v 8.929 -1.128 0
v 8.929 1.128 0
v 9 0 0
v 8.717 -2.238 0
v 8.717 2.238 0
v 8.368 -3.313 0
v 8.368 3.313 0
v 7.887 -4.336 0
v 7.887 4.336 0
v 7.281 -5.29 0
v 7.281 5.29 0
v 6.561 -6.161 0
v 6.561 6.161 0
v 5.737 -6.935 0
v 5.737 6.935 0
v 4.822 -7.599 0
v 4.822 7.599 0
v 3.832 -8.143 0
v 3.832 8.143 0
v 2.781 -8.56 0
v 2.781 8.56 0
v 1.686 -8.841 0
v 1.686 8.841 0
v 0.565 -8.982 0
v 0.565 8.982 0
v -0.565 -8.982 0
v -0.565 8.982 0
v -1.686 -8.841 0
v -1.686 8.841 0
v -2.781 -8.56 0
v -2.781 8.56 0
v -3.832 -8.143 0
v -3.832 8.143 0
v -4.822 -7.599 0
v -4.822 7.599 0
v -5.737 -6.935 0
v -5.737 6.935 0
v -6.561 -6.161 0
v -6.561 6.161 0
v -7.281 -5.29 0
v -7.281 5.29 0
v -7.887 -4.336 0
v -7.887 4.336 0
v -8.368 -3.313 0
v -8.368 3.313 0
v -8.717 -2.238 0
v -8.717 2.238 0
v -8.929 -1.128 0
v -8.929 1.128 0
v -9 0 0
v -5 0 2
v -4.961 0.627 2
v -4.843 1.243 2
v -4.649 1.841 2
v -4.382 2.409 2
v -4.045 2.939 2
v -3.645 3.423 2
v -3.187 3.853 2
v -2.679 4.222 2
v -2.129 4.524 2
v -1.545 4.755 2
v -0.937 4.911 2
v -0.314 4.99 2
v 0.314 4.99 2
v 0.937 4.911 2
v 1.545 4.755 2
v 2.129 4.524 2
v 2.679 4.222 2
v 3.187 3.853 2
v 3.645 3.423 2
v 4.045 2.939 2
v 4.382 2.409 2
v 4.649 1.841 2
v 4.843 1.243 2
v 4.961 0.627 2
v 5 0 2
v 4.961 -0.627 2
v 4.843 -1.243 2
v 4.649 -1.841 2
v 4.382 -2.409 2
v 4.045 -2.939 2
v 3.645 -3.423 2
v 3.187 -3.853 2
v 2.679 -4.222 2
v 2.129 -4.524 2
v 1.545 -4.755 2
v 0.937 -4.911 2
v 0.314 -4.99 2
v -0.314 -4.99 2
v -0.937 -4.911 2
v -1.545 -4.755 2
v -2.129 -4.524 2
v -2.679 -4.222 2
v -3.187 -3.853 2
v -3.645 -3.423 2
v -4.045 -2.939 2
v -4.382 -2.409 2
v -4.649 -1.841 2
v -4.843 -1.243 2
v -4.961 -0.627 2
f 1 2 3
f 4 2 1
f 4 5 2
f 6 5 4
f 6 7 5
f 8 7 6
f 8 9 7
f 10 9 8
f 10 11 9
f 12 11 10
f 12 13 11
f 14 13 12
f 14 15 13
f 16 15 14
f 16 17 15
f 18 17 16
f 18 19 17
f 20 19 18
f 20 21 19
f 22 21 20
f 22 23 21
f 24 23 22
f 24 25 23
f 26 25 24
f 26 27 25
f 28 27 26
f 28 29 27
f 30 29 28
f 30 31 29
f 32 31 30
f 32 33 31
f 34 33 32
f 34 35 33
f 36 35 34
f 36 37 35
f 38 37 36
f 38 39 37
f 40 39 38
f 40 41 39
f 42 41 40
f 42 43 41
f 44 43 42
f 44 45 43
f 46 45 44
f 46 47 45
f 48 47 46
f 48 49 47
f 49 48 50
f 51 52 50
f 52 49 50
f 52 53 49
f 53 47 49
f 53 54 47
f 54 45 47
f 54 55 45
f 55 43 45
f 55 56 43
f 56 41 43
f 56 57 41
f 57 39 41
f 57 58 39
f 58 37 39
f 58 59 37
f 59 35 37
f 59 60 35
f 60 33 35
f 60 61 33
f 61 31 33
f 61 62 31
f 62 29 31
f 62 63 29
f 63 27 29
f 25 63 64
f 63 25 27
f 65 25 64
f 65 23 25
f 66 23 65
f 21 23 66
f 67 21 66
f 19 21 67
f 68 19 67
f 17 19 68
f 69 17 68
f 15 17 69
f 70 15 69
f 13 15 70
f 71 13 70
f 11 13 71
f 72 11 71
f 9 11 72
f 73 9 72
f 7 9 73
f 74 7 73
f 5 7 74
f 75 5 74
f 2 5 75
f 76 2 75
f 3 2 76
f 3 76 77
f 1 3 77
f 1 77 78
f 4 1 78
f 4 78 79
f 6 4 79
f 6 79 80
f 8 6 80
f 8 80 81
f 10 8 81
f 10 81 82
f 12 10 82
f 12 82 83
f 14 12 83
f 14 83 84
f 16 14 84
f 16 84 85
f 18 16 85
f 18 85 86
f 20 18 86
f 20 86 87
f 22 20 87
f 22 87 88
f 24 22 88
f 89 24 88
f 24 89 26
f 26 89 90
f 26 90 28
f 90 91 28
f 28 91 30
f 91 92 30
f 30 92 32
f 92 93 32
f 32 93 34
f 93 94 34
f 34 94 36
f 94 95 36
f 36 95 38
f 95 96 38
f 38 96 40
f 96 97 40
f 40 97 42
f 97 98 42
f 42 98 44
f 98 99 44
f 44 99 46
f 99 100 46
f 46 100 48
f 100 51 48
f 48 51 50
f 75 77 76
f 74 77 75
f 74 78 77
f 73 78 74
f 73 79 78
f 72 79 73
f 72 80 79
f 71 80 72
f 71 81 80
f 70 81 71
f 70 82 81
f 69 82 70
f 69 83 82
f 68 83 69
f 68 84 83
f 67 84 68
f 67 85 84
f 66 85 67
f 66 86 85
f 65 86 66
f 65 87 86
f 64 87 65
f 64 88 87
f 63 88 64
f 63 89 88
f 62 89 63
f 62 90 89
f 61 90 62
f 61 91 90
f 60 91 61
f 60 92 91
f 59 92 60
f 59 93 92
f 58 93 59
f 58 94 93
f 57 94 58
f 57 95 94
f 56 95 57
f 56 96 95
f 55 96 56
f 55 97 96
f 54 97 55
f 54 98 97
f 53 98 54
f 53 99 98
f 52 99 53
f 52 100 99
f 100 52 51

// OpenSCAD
$fn=50;
Dia=10;
height=2;

boss(Dia,height);

module boss(d,h){
    path=[[0,0],[0,height],[2*height,0]];
    rotate_extrude()translate([Dia/2,0,0])polygon(path);
    cylinder(d=Dia,h=height);
}
